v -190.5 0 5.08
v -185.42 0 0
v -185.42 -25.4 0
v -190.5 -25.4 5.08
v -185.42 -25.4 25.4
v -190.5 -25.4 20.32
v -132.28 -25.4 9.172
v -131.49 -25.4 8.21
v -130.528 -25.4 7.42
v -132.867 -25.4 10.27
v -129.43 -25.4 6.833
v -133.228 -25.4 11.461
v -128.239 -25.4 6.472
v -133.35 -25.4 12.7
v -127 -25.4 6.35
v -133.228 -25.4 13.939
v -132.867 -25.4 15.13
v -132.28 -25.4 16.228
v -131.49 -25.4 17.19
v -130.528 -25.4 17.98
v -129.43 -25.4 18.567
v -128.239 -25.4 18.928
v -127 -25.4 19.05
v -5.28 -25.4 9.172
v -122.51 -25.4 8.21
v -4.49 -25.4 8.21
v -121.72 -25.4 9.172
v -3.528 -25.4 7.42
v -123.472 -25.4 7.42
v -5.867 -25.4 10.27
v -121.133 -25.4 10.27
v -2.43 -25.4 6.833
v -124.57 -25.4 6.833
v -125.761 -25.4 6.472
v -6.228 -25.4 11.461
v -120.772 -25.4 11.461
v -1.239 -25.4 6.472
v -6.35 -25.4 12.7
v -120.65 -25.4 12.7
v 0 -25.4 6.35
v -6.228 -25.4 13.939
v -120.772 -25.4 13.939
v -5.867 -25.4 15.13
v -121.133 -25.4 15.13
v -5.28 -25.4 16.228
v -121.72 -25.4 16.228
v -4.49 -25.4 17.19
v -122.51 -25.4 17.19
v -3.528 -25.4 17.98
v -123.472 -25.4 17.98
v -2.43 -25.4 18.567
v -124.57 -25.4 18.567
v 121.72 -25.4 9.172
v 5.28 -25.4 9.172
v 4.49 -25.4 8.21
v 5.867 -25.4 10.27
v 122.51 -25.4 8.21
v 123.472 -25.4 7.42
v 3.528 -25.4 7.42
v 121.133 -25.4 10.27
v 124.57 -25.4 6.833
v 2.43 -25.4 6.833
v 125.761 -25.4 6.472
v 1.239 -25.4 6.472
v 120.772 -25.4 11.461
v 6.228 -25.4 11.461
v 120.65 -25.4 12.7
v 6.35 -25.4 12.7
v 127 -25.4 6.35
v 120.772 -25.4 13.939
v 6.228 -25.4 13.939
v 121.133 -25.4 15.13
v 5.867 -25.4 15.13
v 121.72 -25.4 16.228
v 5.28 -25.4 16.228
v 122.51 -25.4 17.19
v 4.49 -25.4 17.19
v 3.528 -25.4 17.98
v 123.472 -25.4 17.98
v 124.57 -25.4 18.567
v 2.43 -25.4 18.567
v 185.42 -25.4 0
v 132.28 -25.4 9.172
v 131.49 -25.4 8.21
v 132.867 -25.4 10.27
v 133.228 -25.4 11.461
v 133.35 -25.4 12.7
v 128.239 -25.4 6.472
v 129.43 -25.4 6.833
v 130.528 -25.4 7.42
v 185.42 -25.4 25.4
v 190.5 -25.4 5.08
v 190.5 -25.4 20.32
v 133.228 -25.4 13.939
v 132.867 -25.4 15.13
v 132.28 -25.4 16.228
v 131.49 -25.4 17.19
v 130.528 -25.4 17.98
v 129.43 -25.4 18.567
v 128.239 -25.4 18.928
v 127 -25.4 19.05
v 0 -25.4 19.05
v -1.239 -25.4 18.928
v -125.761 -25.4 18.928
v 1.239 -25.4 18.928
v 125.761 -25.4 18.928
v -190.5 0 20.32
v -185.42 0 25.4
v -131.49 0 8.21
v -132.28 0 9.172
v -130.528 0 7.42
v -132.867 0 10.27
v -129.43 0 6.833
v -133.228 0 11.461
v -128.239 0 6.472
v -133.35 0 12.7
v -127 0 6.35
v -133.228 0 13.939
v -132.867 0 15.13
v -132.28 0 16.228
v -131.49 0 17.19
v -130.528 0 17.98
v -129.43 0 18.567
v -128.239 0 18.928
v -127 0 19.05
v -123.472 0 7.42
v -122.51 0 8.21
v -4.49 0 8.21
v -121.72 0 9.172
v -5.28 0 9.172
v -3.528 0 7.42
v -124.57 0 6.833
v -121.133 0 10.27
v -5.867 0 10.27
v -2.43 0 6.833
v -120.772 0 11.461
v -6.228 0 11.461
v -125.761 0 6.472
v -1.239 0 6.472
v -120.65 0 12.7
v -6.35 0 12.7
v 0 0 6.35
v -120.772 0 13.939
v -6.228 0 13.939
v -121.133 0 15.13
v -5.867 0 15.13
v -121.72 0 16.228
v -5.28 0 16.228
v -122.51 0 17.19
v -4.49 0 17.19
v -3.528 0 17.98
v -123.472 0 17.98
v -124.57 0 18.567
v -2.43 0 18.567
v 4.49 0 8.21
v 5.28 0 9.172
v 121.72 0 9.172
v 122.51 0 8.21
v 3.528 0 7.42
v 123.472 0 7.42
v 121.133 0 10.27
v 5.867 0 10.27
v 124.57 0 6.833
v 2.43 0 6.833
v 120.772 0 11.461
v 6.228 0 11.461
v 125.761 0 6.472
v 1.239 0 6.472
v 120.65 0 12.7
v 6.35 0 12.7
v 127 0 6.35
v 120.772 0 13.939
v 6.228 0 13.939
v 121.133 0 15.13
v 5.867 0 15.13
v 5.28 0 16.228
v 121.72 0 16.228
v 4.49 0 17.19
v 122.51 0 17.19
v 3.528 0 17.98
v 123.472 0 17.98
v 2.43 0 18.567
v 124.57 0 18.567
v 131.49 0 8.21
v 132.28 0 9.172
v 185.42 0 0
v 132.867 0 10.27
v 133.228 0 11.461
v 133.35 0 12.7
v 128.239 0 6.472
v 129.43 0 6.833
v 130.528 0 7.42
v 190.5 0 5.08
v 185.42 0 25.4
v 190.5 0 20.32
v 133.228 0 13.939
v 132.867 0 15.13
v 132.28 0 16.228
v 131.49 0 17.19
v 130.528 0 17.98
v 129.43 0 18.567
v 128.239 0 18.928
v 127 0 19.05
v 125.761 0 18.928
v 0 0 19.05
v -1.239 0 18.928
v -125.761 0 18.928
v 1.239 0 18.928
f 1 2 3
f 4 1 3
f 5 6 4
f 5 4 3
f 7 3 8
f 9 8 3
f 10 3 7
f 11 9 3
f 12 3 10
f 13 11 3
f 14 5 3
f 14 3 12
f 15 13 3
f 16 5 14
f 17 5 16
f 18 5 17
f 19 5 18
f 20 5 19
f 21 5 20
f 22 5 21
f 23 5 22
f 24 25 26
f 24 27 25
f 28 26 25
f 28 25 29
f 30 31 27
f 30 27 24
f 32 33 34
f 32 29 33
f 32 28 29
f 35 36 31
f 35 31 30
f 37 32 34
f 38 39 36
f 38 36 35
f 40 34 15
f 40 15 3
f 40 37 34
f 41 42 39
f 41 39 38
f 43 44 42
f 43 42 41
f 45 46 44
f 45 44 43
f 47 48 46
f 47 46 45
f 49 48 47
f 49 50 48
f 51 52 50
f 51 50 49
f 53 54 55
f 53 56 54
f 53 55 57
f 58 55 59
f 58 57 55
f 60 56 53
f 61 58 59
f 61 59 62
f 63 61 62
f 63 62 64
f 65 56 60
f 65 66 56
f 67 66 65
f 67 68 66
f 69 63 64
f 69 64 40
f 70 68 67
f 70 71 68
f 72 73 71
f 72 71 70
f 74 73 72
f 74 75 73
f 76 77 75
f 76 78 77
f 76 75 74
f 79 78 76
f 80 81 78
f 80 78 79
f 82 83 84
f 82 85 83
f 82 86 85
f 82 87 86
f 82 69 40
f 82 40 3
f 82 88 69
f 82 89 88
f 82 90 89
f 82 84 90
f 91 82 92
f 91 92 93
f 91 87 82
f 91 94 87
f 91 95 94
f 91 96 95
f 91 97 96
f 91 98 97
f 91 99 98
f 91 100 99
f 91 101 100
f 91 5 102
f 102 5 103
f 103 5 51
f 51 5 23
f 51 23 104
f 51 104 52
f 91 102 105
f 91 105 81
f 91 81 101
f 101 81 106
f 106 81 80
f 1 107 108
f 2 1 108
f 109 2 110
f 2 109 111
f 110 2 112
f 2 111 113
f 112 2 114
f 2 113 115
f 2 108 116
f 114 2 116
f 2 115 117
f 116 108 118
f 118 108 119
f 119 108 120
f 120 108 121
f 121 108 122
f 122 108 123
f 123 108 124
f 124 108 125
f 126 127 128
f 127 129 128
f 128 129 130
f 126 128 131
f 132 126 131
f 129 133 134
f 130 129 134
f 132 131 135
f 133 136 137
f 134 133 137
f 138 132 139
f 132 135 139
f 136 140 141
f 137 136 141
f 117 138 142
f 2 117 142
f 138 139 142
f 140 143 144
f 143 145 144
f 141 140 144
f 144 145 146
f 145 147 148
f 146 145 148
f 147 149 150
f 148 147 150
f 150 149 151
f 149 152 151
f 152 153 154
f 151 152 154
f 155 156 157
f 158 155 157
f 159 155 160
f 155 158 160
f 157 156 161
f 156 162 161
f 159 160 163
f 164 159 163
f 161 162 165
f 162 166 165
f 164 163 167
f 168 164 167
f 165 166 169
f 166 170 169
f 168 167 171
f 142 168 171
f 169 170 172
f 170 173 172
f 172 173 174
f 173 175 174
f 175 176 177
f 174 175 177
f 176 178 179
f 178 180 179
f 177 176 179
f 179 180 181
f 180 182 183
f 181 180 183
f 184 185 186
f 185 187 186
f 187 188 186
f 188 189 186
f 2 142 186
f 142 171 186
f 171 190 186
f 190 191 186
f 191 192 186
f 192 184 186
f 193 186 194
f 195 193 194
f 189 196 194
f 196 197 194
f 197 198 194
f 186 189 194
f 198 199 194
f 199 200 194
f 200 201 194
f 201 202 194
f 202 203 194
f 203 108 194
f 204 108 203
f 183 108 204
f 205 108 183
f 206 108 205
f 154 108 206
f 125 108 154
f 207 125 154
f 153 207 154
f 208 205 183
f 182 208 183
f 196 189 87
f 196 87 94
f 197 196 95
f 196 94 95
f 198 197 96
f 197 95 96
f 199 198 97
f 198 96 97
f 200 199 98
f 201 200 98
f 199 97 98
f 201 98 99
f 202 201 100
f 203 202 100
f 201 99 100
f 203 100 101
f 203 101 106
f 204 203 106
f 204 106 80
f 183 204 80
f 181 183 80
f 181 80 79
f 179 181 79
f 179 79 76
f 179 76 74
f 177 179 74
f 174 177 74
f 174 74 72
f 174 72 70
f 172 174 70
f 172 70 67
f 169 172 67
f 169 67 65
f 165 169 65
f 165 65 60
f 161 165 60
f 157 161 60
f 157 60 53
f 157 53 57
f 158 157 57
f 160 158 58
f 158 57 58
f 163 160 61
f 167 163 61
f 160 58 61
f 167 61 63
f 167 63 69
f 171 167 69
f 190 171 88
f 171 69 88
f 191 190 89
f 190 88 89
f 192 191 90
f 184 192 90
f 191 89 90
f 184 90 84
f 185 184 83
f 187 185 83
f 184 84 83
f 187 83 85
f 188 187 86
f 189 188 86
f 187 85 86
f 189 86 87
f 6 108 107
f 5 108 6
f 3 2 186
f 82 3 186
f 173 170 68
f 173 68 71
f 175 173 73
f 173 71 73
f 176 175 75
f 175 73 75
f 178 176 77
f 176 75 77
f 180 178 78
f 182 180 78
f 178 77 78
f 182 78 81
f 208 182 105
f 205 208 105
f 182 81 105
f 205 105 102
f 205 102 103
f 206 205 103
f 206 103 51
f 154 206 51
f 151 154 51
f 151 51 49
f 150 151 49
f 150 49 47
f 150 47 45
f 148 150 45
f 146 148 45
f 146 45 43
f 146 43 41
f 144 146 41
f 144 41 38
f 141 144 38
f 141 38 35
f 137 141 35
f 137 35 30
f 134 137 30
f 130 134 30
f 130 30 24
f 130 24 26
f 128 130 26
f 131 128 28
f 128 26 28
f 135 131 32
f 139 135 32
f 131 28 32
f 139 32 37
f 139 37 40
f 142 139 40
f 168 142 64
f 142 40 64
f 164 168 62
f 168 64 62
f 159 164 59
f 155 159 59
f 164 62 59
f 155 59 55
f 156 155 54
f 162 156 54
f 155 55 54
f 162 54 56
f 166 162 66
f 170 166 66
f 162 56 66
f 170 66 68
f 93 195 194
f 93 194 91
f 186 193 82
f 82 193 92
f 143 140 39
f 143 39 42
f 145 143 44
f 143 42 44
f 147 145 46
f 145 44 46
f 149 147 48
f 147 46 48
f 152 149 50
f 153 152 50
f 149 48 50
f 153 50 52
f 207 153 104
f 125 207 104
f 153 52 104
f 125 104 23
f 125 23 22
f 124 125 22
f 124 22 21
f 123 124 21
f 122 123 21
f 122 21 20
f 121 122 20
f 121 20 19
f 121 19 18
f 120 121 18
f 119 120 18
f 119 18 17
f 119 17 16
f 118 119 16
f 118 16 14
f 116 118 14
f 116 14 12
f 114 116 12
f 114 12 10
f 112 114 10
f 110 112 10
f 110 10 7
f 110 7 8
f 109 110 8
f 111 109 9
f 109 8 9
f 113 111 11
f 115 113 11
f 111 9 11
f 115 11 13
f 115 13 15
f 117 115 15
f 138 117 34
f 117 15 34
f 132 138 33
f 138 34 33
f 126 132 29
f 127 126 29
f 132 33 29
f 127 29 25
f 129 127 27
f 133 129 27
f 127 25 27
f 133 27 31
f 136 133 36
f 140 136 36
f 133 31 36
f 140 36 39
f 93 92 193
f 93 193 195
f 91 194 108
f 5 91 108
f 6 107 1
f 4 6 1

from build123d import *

# Parameters (mm, degrees)
F1_DEPTH = 25.4
F2_R     = 6.35
F3_DEPTH = 50.8
F4_SIZE  = 5.08
F5_SIZE  = 5.08


with BuildPart() as f1:
    # F0 (on Front) → F1 (new body)
    with BuildSketch(Plane.XZ):
        Polygon((-190.5, 0), (0, 0), (190.5, 0), (190.5, 25.4), (-190.5, 25.4), align=None)
    extrude(amount=F1_DEPTH)

    # F2 (on face) → F3 (cut)
    with BuildSketch(Plane.XZ.offset(25.4)):
        with Locations((-127, 12.7)):
            Circle(F2_R)
        with Locations((0, 12.7)):
            Circle(F2_R)
        with Locations((127, 12.7)):
            Circle(F2_R)
    extrude(amount=-F3_DEPTH, mode=Mode.SUBTRACT)

    # F4
    f4_edges = [f1.edges().sort_by_distance(p)[0] for p in [
        (-190.5, -12.7, 25.4),
    ]]
    chamfer(f4_edges, length=F4_SIZE)

    # F5
    f5_edges = [f1.edges().sort_by_distance(p)[0] for p in [
        (-190.5, -12.7, 0),
        (190.5, -12.7, 25.4),
        (190.5, -12.7, 0),
    ]]
    chamfer(f5_edges, length=F5_SIZE)


solid = f1.part
